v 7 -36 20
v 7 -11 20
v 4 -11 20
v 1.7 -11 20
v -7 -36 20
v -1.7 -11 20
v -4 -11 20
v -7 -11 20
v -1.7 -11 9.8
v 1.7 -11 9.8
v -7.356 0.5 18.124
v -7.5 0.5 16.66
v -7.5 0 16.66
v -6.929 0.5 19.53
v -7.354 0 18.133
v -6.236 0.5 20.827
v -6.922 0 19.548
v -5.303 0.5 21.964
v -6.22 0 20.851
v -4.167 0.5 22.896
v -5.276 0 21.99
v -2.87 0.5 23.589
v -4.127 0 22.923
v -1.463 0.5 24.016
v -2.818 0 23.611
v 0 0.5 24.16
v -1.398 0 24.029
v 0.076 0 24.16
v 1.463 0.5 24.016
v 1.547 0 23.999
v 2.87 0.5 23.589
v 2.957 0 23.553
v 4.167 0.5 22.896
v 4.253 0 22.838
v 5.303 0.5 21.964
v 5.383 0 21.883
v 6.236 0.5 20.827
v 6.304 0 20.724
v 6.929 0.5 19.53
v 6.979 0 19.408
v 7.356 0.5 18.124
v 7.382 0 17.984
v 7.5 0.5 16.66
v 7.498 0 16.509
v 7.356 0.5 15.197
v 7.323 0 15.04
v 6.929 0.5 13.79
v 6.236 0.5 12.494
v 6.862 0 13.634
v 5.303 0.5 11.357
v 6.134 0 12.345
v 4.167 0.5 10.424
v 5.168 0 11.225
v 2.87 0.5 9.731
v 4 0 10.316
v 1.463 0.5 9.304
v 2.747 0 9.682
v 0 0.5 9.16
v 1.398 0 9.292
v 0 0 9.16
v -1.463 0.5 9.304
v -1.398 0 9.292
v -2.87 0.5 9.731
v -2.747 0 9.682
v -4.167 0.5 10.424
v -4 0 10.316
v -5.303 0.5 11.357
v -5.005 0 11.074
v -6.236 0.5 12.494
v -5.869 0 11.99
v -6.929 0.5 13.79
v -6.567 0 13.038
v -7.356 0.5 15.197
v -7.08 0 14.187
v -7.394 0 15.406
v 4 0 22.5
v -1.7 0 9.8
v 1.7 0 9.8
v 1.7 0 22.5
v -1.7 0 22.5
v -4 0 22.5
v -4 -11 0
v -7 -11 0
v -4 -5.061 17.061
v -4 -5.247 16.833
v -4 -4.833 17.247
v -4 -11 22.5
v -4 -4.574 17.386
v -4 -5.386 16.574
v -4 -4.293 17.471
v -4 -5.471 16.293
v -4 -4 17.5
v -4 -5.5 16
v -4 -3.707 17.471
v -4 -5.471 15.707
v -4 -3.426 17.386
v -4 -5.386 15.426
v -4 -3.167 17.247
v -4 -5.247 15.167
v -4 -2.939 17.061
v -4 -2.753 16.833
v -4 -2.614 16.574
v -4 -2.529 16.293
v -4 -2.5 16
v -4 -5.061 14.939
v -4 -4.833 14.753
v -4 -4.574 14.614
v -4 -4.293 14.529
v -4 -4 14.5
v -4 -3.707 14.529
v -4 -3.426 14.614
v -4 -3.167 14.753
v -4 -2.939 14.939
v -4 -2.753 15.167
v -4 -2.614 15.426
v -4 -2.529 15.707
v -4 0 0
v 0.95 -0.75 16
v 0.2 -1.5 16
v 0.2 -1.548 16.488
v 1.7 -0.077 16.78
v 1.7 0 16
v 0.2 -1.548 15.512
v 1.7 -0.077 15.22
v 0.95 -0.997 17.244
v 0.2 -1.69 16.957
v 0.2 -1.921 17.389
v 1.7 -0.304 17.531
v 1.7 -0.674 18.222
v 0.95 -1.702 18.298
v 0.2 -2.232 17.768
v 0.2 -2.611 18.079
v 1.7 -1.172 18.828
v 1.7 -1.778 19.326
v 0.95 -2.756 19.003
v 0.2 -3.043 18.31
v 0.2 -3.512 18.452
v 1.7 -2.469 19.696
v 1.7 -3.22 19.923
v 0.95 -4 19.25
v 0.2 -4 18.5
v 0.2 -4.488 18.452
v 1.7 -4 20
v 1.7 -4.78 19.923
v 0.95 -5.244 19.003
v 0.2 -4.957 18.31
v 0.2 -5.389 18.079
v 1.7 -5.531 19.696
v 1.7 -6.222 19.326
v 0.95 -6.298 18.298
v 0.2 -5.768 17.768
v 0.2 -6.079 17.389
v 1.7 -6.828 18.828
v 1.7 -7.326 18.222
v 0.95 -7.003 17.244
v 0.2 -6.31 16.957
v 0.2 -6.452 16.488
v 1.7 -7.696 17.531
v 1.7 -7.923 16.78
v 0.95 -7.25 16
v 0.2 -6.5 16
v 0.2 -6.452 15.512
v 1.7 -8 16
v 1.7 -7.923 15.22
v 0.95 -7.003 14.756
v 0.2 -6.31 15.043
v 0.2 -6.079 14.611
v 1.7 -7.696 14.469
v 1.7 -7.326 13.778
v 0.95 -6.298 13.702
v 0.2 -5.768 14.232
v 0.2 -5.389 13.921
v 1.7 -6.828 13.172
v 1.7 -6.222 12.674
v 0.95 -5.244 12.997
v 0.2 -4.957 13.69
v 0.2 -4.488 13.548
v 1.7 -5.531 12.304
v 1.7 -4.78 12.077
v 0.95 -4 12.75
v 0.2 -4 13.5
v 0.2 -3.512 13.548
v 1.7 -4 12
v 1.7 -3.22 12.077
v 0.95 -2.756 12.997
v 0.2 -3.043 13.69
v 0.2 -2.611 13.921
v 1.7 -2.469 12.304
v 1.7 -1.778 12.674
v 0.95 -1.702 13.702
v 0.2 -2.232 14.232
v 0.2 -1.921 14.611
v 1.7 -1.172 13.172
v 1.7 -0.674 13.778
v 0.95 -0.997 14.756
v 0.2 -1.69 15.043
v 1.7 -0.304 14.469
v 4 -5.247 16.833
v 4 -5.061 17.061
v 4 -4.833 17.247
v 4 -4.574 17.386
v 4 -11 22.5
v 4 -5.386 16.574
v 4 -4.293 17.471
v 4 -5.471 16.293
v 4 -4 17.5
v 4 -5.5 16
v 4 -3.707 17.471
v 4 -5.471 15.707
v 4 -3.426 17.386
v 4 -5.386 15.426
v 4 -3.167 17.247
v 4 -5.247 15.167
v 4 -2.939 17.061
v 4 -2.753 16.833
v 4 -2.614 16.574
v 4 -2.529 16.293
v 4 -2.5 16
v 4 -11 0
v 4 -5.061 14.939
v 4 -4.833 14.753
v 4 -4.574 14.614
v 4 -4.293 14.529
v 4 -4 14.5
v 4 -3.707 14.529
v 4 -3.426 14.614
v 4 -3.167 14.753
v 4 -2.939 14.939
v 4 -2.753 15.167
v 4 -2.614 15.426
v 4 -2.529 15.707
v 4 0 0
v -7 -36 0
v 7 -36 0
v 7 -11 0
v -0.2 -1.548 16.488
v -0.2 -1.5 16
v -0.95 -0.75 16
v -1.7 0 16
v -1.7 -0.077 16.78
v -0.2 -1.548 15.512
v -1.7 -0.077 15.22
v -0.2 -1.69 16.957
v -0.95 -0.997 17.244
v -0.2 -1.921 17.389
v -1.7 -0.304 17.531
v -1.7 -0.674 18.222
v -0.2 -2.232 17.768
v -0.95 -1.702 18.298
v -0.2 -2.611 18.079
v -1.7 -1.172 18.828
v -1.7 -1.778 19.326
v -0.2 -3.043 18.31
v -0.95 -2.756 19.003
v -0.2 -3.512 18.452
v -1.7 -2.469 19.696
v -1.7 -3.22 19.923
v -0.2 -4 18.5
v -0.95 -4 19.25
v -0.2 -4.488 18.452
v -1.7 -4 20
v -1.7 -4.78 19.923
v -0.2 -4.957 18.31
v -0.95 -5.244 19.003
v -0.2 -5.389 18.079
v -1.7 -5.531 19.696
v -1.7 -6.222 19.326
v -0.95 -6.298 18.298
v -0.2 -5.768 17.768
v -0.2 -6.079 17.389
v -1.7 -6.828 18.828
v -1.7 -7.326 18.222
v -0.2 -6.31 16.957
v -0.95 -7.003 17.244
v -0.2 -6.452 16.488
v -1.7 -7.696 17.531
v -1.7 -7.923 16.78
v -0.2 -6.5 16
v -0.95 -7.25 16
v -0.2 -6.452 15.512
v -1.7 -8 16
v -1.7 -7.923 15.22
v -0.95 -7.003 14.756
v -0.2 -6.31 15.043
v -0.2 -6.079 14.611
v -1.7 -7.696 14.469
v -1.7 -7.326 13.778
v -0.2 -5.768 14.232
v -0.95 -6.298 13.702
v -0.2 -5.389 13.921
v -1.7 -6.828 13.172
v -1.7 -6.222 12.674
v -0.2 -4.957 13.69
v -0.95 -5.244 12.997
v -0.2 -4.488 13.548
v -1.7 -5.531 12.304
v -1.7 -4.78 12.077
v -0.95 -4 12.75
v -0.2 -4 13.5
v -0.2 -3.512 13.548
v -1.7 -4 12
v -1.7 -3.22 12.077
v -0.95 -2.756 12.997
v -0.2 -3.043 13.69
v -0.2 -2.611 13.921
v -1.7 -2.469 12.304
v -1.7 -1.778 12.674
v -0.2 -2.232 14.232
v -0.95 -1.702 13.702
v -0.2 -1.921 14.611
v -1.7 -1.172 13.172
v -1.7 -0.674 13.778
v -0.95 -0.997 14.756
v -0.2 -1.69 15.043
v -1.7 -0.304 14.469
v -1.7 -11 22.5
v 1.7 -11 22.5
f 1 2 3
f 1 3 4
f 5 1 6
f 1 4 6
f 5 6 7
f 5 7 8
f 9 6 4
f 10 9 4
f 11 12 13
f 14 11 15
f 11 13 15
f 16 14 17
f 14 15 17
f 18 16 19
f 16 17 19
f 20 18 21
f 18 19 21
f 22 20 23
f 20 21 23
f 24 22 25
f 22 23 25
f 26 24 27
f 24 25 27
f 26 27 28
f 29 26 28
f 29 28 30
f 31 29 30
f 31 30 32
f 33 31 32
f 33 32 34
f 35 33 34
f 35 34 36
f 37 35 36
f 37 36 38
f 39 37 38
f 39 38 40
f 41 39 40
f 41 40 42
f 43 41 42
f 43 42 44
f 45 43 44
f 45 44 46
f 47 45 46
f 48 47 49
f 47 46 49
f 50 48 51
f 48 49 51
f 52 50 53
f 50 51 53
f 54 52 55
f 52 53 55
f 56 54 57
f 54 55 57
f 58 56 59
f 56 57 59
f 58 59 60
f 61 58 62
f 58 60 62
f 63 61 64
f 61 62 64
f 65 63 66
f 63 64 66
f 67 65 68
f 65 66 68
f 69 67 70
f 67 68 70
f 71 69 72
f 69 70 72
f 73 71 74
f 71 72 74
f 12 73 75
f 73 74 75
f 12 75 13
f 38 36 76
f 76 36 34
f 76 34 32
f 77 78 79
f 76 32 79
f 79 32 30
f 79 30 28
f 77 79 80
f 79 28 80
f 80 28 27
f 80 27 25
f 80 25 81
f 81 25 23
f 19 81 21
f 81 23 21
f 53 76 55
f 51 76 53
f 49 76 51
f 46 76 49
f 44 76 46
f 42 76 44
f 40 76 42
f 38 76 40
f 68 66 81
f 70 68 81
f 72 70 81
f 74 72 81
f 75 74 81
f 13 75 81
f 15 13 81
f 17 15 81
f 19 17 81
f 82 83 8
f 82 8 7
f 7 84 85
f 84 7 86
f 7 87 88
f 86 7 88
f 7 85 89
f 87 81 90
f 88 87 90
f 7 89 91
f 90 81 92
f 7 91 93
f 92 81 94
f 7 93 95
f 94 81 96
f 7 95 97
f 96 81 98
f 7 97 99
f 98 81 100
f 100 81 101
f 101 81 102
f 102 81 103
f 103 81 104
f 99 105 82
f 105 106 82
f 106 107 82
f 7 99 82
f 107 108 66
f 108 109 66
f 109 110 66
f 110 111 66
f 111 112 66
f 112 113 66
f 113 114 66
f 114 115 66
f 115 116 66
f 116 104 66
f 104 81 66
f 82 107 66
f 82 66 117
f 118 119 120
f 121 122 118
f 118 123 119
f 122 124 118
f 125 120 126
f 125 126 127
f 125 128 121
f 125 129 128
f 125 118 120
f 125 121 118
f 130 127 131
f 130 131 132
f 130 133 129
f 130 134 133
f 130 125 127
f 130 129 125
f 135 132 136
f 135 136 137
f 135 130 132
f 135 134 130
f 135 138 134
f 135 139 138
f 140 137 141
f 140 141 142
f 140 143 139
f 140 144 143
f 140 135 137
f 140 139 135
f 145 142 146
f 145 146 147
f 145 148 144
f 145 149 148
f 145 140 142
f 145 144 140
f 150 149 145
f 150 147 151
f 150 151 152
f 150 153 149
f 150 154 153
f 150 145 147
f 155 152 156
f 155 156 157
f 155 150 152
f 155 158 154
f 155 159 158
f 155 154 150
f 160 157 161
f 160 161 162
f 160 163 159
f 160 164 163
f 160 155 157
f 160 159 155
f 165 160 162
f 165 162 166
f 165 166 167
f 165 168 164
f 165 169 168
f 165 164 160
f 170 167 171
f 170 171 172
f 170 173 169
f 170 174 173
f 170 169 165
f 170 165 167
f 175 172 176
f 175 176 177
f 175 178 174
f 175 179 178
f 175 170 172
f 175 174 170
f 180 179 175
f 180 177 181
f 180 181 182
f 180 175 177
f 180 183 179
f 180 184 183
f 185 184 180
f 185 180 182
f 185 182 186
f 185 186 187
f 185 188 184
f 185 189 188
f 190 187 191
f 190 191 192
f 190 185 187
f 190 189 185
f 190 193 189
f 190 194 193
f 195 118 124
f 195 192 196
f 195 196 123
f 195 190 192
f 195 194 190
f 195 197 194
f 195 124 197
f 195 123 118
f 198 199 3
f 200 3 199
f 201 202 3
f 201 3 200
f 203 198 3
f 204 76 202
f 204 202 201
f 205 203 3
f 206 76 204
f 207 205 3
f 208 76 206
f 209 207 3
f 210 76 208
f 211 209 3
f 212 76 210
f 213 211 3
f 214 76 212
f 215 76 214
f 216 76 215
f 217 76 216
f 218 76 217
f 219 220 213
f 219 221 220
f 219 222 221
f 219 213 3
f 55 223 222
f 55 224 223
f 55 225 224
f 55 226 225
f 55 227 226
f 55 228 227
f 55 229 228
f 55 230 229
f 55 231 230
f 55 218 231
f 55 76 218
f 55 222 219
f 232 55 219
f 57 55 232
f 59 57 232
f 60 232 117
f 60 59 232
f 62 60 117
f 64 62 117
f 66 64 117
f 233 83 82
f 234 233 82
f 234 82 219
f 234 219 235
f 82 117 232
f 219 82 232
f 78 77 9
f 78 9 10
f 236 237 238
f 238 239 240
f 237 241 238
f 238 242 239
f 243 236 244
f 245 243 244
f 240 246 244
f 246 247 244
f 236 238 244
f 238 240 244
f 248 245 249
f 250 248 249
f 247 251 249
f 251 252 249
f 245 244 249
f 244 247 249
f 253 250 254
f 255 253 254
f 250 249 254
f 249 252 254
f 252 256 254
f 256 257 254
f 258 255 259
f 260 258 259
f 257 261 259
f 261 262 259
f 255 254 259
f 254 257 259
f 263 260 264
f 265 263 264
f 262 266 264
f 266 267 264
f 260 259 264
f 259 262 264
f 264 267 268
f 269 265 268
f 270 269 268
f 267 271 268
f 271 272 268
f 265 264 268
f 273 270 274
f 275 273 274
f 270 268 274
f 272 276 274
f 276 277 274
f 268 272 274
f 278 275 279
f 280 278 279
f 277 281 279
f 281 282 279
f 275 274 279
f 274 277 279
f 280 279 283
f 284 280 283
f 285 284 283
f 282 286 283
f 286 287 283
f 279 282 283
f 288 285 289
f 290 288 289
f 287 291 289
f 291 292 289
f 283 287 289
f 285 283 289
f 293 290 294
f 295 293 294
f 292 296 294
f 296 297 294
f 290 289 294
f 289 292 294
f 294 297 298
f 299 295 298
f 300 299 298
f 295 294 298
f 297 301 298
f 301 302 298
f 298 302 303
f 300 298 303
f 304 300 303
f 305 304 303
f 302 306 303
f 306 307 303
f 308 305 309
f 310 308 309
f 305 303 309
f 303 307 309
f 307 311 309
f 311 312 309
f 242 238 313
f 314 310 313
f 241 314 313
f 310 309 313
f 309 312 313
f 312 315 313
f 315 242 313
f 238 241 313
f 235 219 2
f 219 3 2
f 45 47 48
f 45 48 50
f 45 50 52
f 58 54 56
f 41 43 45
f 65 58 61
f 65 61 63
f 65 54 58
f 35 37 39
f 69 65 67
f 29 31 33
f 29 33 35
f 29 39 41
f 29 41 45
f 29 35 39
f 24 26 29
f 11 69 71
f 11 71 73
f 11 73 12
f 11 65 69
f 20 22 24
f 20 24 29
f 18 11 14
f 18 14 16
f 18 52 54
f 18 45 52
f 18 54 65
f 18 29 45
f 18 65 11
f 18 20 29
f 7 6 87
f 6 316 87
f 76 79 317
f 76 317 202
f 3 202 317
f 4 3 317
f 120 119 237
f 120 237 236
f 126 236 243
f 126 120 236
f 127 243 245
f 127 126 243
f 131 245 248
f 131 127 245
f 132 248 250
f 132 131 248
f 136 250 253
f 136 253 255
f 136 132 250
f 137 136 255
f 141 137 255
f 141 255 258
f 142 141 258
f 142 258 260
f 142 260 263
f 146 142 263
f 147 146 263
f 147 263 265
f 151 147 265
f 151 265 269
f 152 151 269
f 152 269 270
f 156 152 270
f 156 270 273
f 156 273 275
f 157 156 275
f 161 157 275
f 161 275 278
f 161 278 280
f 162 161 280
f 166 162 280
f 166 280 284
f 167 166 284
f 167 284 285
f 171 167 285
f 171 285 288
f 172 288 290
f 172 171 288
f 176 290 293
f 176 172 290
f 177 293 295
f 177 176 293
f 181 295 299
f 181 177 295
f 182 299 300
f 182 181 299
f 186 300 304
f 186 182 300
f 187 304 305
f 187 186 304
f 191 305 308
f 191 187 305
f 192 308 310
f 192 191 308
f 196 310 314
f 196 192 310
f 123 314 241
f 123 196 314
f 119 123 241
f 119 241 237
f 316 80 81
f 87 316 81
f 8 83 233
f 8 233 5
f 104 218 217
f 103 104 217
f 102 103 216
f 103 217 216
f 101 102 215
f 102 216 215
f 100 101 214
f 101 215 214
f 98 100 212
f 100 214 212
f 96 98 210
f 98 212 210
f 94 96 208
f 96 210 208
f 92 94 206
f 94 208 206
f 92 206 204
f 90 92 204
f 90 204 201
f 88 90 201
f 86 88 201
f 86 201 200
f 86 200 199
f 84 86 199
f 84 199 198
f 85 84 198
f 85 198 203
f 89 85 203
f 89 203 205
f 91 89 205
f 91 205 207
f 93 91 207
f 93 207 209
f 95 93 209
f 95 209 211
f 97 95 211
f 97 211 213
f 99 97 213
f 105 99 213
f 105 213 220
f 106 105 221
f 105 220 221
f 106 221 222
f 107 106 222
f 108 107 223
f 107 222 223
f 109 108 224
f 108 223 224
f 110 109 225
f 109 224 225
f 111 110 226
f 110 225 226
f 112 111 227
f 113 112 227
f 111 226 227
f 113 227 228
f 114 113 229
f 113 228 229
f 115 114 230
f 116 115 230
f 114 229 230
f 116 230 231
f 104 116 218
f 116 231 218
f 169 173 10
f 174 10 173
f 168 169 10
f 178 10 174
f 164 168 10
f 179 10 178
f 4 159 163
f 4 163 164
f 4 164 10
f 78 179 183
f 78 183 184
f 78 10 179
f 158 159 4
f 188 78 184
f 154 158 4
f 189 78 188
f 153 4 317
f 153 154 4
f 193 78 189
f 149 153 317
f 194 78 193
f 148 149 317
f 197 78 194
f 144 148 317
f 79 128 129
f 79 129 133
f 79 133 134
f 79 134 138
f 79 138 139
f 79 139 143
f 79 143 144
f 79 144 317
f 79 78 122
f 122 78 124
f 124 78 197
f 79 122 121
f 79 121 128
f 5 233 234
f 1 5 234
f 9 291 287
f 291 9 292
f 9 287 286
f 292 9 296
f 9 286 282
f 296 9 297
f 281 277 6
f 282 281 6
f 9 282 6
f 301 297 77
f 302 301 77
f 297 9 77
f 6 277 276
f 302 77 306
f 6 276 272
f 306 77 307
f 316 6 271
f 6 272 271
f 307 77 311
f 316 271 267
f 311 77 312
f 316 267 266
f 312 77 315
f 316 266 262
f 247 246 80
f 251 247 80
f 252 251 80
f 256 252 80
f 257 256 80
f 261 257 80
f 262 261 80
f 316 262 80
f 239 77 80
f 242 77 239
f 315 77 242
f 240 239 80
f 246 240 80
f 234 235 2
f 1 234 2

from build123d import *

# Parameters (mm, degrees)
F1_DEPTH  = 11
F3_W      = 3
F3_H      = 20
F3_W_2    = 3.4
F3_H_2    = 10.2
F4_DEPTH  = 25
F5_R      = 1.5
F6_DEPTH  = 25
F5_R_2    = 2.5
F7_DEPTH  = 8
F8_SIZE   = 1.49999
F9_SIZE   = 1.49999
F10_R     = 7.5
F12_DEPTH = 0.5


# Not quite as in the source:
# - a fillet or chamfer is up to 0.001 mm smaller than in the source, because OpenCascade refuses the exact size


with BuildPart() as f1:
    # F0 (on Front) → F1 (new body)
    with BuildSketch(Plane.XZ):
        Polygon((-4, 0), (0, 0), (0, 9.8), (-1.7, 9.8), (-1.7, 22.5), (-4, 22.5), align=None)
    extrude(amount=F1_DEPTH)

    # F2: F1 across face


with BuildPart() as f1_1:
    add(f1.part)
    add(f1.part.mirror(Plane(origin=(0, -5.5, 4.9), x_dir=(0, 1, 0), z_dir=(1, 0, 0))))

    # F3 (on face) → F4 (join)
    with BuildSketch(Plane.XZ.offset(11)):
        with Locations((5.5, 10)):
            Rectangle(F3_W, F3_H)
        with Locations((0, 14.9)):
            Rectangle(F3_W_2, F3_H_2)
        Polygon((-4, 0), (0, 0), (4, 0), (4, 20), (1.7, 20), (1.7, 9.8), (-1.7, 9.8), (-1.7, 20), (-4, 20), align=None)
        with Locations((-5.5, 10)):
            Rectangle(F3_W, F3_H)
    extrude(amount=F4_DEPTH)

    # F5 (on face) → F6 (cut)
    with BuildSketch(Plane.YZ.offset(4)):
        with Locations((-4, 16)):
            Circle(F5_R)
    extrude(amount=-F6_DEPTH, mode=Mode.SUBTRACT)

    # F5 (on face) → F7 (join, through all)
    with BuildSketch(Plane.YZ.offset(4)):
        with Locations((-4, 16)):
            Circle(F5_R_2)
        with Locations((-4, 16)):
            Circle(F5_R, mode=Mode.SUBTRACT)
    extrude(amount=-F7_DEPTH)

    # F8 (size 1.5 in the source; OpenCascade refuses exactly that, so slightly less here)
    f8_edges = [f1_1.edges().sort_by_distance(p)[0] for p in [
        (-1.7, -6.5, 16),
    ]]
    chamfer(f8_edges, length=F8_SIZE)

    # F9 (size 1.5 in the source; OpenCascade refuses exactly that, so slightly less here)
    f9_edges = [f1_1.edges().sort_by_distance(p)[0] for p in [
        (1.7, -6.5, 16),
    ]]
    chamfer(f9_edges, length=F9_SIZE)

    # F10 (on face) → F12 (join)
    with BuildSketch(Plane(origin=(0, 0, 0), x_dir=(-1, 0, 0), z_dir=(0, 1, 0))):
        with Locations((0, 16.6603474262)):
            Circle(F10_R)
    extrude(amount=F12_DEPTH)


solid = f1_1.part
